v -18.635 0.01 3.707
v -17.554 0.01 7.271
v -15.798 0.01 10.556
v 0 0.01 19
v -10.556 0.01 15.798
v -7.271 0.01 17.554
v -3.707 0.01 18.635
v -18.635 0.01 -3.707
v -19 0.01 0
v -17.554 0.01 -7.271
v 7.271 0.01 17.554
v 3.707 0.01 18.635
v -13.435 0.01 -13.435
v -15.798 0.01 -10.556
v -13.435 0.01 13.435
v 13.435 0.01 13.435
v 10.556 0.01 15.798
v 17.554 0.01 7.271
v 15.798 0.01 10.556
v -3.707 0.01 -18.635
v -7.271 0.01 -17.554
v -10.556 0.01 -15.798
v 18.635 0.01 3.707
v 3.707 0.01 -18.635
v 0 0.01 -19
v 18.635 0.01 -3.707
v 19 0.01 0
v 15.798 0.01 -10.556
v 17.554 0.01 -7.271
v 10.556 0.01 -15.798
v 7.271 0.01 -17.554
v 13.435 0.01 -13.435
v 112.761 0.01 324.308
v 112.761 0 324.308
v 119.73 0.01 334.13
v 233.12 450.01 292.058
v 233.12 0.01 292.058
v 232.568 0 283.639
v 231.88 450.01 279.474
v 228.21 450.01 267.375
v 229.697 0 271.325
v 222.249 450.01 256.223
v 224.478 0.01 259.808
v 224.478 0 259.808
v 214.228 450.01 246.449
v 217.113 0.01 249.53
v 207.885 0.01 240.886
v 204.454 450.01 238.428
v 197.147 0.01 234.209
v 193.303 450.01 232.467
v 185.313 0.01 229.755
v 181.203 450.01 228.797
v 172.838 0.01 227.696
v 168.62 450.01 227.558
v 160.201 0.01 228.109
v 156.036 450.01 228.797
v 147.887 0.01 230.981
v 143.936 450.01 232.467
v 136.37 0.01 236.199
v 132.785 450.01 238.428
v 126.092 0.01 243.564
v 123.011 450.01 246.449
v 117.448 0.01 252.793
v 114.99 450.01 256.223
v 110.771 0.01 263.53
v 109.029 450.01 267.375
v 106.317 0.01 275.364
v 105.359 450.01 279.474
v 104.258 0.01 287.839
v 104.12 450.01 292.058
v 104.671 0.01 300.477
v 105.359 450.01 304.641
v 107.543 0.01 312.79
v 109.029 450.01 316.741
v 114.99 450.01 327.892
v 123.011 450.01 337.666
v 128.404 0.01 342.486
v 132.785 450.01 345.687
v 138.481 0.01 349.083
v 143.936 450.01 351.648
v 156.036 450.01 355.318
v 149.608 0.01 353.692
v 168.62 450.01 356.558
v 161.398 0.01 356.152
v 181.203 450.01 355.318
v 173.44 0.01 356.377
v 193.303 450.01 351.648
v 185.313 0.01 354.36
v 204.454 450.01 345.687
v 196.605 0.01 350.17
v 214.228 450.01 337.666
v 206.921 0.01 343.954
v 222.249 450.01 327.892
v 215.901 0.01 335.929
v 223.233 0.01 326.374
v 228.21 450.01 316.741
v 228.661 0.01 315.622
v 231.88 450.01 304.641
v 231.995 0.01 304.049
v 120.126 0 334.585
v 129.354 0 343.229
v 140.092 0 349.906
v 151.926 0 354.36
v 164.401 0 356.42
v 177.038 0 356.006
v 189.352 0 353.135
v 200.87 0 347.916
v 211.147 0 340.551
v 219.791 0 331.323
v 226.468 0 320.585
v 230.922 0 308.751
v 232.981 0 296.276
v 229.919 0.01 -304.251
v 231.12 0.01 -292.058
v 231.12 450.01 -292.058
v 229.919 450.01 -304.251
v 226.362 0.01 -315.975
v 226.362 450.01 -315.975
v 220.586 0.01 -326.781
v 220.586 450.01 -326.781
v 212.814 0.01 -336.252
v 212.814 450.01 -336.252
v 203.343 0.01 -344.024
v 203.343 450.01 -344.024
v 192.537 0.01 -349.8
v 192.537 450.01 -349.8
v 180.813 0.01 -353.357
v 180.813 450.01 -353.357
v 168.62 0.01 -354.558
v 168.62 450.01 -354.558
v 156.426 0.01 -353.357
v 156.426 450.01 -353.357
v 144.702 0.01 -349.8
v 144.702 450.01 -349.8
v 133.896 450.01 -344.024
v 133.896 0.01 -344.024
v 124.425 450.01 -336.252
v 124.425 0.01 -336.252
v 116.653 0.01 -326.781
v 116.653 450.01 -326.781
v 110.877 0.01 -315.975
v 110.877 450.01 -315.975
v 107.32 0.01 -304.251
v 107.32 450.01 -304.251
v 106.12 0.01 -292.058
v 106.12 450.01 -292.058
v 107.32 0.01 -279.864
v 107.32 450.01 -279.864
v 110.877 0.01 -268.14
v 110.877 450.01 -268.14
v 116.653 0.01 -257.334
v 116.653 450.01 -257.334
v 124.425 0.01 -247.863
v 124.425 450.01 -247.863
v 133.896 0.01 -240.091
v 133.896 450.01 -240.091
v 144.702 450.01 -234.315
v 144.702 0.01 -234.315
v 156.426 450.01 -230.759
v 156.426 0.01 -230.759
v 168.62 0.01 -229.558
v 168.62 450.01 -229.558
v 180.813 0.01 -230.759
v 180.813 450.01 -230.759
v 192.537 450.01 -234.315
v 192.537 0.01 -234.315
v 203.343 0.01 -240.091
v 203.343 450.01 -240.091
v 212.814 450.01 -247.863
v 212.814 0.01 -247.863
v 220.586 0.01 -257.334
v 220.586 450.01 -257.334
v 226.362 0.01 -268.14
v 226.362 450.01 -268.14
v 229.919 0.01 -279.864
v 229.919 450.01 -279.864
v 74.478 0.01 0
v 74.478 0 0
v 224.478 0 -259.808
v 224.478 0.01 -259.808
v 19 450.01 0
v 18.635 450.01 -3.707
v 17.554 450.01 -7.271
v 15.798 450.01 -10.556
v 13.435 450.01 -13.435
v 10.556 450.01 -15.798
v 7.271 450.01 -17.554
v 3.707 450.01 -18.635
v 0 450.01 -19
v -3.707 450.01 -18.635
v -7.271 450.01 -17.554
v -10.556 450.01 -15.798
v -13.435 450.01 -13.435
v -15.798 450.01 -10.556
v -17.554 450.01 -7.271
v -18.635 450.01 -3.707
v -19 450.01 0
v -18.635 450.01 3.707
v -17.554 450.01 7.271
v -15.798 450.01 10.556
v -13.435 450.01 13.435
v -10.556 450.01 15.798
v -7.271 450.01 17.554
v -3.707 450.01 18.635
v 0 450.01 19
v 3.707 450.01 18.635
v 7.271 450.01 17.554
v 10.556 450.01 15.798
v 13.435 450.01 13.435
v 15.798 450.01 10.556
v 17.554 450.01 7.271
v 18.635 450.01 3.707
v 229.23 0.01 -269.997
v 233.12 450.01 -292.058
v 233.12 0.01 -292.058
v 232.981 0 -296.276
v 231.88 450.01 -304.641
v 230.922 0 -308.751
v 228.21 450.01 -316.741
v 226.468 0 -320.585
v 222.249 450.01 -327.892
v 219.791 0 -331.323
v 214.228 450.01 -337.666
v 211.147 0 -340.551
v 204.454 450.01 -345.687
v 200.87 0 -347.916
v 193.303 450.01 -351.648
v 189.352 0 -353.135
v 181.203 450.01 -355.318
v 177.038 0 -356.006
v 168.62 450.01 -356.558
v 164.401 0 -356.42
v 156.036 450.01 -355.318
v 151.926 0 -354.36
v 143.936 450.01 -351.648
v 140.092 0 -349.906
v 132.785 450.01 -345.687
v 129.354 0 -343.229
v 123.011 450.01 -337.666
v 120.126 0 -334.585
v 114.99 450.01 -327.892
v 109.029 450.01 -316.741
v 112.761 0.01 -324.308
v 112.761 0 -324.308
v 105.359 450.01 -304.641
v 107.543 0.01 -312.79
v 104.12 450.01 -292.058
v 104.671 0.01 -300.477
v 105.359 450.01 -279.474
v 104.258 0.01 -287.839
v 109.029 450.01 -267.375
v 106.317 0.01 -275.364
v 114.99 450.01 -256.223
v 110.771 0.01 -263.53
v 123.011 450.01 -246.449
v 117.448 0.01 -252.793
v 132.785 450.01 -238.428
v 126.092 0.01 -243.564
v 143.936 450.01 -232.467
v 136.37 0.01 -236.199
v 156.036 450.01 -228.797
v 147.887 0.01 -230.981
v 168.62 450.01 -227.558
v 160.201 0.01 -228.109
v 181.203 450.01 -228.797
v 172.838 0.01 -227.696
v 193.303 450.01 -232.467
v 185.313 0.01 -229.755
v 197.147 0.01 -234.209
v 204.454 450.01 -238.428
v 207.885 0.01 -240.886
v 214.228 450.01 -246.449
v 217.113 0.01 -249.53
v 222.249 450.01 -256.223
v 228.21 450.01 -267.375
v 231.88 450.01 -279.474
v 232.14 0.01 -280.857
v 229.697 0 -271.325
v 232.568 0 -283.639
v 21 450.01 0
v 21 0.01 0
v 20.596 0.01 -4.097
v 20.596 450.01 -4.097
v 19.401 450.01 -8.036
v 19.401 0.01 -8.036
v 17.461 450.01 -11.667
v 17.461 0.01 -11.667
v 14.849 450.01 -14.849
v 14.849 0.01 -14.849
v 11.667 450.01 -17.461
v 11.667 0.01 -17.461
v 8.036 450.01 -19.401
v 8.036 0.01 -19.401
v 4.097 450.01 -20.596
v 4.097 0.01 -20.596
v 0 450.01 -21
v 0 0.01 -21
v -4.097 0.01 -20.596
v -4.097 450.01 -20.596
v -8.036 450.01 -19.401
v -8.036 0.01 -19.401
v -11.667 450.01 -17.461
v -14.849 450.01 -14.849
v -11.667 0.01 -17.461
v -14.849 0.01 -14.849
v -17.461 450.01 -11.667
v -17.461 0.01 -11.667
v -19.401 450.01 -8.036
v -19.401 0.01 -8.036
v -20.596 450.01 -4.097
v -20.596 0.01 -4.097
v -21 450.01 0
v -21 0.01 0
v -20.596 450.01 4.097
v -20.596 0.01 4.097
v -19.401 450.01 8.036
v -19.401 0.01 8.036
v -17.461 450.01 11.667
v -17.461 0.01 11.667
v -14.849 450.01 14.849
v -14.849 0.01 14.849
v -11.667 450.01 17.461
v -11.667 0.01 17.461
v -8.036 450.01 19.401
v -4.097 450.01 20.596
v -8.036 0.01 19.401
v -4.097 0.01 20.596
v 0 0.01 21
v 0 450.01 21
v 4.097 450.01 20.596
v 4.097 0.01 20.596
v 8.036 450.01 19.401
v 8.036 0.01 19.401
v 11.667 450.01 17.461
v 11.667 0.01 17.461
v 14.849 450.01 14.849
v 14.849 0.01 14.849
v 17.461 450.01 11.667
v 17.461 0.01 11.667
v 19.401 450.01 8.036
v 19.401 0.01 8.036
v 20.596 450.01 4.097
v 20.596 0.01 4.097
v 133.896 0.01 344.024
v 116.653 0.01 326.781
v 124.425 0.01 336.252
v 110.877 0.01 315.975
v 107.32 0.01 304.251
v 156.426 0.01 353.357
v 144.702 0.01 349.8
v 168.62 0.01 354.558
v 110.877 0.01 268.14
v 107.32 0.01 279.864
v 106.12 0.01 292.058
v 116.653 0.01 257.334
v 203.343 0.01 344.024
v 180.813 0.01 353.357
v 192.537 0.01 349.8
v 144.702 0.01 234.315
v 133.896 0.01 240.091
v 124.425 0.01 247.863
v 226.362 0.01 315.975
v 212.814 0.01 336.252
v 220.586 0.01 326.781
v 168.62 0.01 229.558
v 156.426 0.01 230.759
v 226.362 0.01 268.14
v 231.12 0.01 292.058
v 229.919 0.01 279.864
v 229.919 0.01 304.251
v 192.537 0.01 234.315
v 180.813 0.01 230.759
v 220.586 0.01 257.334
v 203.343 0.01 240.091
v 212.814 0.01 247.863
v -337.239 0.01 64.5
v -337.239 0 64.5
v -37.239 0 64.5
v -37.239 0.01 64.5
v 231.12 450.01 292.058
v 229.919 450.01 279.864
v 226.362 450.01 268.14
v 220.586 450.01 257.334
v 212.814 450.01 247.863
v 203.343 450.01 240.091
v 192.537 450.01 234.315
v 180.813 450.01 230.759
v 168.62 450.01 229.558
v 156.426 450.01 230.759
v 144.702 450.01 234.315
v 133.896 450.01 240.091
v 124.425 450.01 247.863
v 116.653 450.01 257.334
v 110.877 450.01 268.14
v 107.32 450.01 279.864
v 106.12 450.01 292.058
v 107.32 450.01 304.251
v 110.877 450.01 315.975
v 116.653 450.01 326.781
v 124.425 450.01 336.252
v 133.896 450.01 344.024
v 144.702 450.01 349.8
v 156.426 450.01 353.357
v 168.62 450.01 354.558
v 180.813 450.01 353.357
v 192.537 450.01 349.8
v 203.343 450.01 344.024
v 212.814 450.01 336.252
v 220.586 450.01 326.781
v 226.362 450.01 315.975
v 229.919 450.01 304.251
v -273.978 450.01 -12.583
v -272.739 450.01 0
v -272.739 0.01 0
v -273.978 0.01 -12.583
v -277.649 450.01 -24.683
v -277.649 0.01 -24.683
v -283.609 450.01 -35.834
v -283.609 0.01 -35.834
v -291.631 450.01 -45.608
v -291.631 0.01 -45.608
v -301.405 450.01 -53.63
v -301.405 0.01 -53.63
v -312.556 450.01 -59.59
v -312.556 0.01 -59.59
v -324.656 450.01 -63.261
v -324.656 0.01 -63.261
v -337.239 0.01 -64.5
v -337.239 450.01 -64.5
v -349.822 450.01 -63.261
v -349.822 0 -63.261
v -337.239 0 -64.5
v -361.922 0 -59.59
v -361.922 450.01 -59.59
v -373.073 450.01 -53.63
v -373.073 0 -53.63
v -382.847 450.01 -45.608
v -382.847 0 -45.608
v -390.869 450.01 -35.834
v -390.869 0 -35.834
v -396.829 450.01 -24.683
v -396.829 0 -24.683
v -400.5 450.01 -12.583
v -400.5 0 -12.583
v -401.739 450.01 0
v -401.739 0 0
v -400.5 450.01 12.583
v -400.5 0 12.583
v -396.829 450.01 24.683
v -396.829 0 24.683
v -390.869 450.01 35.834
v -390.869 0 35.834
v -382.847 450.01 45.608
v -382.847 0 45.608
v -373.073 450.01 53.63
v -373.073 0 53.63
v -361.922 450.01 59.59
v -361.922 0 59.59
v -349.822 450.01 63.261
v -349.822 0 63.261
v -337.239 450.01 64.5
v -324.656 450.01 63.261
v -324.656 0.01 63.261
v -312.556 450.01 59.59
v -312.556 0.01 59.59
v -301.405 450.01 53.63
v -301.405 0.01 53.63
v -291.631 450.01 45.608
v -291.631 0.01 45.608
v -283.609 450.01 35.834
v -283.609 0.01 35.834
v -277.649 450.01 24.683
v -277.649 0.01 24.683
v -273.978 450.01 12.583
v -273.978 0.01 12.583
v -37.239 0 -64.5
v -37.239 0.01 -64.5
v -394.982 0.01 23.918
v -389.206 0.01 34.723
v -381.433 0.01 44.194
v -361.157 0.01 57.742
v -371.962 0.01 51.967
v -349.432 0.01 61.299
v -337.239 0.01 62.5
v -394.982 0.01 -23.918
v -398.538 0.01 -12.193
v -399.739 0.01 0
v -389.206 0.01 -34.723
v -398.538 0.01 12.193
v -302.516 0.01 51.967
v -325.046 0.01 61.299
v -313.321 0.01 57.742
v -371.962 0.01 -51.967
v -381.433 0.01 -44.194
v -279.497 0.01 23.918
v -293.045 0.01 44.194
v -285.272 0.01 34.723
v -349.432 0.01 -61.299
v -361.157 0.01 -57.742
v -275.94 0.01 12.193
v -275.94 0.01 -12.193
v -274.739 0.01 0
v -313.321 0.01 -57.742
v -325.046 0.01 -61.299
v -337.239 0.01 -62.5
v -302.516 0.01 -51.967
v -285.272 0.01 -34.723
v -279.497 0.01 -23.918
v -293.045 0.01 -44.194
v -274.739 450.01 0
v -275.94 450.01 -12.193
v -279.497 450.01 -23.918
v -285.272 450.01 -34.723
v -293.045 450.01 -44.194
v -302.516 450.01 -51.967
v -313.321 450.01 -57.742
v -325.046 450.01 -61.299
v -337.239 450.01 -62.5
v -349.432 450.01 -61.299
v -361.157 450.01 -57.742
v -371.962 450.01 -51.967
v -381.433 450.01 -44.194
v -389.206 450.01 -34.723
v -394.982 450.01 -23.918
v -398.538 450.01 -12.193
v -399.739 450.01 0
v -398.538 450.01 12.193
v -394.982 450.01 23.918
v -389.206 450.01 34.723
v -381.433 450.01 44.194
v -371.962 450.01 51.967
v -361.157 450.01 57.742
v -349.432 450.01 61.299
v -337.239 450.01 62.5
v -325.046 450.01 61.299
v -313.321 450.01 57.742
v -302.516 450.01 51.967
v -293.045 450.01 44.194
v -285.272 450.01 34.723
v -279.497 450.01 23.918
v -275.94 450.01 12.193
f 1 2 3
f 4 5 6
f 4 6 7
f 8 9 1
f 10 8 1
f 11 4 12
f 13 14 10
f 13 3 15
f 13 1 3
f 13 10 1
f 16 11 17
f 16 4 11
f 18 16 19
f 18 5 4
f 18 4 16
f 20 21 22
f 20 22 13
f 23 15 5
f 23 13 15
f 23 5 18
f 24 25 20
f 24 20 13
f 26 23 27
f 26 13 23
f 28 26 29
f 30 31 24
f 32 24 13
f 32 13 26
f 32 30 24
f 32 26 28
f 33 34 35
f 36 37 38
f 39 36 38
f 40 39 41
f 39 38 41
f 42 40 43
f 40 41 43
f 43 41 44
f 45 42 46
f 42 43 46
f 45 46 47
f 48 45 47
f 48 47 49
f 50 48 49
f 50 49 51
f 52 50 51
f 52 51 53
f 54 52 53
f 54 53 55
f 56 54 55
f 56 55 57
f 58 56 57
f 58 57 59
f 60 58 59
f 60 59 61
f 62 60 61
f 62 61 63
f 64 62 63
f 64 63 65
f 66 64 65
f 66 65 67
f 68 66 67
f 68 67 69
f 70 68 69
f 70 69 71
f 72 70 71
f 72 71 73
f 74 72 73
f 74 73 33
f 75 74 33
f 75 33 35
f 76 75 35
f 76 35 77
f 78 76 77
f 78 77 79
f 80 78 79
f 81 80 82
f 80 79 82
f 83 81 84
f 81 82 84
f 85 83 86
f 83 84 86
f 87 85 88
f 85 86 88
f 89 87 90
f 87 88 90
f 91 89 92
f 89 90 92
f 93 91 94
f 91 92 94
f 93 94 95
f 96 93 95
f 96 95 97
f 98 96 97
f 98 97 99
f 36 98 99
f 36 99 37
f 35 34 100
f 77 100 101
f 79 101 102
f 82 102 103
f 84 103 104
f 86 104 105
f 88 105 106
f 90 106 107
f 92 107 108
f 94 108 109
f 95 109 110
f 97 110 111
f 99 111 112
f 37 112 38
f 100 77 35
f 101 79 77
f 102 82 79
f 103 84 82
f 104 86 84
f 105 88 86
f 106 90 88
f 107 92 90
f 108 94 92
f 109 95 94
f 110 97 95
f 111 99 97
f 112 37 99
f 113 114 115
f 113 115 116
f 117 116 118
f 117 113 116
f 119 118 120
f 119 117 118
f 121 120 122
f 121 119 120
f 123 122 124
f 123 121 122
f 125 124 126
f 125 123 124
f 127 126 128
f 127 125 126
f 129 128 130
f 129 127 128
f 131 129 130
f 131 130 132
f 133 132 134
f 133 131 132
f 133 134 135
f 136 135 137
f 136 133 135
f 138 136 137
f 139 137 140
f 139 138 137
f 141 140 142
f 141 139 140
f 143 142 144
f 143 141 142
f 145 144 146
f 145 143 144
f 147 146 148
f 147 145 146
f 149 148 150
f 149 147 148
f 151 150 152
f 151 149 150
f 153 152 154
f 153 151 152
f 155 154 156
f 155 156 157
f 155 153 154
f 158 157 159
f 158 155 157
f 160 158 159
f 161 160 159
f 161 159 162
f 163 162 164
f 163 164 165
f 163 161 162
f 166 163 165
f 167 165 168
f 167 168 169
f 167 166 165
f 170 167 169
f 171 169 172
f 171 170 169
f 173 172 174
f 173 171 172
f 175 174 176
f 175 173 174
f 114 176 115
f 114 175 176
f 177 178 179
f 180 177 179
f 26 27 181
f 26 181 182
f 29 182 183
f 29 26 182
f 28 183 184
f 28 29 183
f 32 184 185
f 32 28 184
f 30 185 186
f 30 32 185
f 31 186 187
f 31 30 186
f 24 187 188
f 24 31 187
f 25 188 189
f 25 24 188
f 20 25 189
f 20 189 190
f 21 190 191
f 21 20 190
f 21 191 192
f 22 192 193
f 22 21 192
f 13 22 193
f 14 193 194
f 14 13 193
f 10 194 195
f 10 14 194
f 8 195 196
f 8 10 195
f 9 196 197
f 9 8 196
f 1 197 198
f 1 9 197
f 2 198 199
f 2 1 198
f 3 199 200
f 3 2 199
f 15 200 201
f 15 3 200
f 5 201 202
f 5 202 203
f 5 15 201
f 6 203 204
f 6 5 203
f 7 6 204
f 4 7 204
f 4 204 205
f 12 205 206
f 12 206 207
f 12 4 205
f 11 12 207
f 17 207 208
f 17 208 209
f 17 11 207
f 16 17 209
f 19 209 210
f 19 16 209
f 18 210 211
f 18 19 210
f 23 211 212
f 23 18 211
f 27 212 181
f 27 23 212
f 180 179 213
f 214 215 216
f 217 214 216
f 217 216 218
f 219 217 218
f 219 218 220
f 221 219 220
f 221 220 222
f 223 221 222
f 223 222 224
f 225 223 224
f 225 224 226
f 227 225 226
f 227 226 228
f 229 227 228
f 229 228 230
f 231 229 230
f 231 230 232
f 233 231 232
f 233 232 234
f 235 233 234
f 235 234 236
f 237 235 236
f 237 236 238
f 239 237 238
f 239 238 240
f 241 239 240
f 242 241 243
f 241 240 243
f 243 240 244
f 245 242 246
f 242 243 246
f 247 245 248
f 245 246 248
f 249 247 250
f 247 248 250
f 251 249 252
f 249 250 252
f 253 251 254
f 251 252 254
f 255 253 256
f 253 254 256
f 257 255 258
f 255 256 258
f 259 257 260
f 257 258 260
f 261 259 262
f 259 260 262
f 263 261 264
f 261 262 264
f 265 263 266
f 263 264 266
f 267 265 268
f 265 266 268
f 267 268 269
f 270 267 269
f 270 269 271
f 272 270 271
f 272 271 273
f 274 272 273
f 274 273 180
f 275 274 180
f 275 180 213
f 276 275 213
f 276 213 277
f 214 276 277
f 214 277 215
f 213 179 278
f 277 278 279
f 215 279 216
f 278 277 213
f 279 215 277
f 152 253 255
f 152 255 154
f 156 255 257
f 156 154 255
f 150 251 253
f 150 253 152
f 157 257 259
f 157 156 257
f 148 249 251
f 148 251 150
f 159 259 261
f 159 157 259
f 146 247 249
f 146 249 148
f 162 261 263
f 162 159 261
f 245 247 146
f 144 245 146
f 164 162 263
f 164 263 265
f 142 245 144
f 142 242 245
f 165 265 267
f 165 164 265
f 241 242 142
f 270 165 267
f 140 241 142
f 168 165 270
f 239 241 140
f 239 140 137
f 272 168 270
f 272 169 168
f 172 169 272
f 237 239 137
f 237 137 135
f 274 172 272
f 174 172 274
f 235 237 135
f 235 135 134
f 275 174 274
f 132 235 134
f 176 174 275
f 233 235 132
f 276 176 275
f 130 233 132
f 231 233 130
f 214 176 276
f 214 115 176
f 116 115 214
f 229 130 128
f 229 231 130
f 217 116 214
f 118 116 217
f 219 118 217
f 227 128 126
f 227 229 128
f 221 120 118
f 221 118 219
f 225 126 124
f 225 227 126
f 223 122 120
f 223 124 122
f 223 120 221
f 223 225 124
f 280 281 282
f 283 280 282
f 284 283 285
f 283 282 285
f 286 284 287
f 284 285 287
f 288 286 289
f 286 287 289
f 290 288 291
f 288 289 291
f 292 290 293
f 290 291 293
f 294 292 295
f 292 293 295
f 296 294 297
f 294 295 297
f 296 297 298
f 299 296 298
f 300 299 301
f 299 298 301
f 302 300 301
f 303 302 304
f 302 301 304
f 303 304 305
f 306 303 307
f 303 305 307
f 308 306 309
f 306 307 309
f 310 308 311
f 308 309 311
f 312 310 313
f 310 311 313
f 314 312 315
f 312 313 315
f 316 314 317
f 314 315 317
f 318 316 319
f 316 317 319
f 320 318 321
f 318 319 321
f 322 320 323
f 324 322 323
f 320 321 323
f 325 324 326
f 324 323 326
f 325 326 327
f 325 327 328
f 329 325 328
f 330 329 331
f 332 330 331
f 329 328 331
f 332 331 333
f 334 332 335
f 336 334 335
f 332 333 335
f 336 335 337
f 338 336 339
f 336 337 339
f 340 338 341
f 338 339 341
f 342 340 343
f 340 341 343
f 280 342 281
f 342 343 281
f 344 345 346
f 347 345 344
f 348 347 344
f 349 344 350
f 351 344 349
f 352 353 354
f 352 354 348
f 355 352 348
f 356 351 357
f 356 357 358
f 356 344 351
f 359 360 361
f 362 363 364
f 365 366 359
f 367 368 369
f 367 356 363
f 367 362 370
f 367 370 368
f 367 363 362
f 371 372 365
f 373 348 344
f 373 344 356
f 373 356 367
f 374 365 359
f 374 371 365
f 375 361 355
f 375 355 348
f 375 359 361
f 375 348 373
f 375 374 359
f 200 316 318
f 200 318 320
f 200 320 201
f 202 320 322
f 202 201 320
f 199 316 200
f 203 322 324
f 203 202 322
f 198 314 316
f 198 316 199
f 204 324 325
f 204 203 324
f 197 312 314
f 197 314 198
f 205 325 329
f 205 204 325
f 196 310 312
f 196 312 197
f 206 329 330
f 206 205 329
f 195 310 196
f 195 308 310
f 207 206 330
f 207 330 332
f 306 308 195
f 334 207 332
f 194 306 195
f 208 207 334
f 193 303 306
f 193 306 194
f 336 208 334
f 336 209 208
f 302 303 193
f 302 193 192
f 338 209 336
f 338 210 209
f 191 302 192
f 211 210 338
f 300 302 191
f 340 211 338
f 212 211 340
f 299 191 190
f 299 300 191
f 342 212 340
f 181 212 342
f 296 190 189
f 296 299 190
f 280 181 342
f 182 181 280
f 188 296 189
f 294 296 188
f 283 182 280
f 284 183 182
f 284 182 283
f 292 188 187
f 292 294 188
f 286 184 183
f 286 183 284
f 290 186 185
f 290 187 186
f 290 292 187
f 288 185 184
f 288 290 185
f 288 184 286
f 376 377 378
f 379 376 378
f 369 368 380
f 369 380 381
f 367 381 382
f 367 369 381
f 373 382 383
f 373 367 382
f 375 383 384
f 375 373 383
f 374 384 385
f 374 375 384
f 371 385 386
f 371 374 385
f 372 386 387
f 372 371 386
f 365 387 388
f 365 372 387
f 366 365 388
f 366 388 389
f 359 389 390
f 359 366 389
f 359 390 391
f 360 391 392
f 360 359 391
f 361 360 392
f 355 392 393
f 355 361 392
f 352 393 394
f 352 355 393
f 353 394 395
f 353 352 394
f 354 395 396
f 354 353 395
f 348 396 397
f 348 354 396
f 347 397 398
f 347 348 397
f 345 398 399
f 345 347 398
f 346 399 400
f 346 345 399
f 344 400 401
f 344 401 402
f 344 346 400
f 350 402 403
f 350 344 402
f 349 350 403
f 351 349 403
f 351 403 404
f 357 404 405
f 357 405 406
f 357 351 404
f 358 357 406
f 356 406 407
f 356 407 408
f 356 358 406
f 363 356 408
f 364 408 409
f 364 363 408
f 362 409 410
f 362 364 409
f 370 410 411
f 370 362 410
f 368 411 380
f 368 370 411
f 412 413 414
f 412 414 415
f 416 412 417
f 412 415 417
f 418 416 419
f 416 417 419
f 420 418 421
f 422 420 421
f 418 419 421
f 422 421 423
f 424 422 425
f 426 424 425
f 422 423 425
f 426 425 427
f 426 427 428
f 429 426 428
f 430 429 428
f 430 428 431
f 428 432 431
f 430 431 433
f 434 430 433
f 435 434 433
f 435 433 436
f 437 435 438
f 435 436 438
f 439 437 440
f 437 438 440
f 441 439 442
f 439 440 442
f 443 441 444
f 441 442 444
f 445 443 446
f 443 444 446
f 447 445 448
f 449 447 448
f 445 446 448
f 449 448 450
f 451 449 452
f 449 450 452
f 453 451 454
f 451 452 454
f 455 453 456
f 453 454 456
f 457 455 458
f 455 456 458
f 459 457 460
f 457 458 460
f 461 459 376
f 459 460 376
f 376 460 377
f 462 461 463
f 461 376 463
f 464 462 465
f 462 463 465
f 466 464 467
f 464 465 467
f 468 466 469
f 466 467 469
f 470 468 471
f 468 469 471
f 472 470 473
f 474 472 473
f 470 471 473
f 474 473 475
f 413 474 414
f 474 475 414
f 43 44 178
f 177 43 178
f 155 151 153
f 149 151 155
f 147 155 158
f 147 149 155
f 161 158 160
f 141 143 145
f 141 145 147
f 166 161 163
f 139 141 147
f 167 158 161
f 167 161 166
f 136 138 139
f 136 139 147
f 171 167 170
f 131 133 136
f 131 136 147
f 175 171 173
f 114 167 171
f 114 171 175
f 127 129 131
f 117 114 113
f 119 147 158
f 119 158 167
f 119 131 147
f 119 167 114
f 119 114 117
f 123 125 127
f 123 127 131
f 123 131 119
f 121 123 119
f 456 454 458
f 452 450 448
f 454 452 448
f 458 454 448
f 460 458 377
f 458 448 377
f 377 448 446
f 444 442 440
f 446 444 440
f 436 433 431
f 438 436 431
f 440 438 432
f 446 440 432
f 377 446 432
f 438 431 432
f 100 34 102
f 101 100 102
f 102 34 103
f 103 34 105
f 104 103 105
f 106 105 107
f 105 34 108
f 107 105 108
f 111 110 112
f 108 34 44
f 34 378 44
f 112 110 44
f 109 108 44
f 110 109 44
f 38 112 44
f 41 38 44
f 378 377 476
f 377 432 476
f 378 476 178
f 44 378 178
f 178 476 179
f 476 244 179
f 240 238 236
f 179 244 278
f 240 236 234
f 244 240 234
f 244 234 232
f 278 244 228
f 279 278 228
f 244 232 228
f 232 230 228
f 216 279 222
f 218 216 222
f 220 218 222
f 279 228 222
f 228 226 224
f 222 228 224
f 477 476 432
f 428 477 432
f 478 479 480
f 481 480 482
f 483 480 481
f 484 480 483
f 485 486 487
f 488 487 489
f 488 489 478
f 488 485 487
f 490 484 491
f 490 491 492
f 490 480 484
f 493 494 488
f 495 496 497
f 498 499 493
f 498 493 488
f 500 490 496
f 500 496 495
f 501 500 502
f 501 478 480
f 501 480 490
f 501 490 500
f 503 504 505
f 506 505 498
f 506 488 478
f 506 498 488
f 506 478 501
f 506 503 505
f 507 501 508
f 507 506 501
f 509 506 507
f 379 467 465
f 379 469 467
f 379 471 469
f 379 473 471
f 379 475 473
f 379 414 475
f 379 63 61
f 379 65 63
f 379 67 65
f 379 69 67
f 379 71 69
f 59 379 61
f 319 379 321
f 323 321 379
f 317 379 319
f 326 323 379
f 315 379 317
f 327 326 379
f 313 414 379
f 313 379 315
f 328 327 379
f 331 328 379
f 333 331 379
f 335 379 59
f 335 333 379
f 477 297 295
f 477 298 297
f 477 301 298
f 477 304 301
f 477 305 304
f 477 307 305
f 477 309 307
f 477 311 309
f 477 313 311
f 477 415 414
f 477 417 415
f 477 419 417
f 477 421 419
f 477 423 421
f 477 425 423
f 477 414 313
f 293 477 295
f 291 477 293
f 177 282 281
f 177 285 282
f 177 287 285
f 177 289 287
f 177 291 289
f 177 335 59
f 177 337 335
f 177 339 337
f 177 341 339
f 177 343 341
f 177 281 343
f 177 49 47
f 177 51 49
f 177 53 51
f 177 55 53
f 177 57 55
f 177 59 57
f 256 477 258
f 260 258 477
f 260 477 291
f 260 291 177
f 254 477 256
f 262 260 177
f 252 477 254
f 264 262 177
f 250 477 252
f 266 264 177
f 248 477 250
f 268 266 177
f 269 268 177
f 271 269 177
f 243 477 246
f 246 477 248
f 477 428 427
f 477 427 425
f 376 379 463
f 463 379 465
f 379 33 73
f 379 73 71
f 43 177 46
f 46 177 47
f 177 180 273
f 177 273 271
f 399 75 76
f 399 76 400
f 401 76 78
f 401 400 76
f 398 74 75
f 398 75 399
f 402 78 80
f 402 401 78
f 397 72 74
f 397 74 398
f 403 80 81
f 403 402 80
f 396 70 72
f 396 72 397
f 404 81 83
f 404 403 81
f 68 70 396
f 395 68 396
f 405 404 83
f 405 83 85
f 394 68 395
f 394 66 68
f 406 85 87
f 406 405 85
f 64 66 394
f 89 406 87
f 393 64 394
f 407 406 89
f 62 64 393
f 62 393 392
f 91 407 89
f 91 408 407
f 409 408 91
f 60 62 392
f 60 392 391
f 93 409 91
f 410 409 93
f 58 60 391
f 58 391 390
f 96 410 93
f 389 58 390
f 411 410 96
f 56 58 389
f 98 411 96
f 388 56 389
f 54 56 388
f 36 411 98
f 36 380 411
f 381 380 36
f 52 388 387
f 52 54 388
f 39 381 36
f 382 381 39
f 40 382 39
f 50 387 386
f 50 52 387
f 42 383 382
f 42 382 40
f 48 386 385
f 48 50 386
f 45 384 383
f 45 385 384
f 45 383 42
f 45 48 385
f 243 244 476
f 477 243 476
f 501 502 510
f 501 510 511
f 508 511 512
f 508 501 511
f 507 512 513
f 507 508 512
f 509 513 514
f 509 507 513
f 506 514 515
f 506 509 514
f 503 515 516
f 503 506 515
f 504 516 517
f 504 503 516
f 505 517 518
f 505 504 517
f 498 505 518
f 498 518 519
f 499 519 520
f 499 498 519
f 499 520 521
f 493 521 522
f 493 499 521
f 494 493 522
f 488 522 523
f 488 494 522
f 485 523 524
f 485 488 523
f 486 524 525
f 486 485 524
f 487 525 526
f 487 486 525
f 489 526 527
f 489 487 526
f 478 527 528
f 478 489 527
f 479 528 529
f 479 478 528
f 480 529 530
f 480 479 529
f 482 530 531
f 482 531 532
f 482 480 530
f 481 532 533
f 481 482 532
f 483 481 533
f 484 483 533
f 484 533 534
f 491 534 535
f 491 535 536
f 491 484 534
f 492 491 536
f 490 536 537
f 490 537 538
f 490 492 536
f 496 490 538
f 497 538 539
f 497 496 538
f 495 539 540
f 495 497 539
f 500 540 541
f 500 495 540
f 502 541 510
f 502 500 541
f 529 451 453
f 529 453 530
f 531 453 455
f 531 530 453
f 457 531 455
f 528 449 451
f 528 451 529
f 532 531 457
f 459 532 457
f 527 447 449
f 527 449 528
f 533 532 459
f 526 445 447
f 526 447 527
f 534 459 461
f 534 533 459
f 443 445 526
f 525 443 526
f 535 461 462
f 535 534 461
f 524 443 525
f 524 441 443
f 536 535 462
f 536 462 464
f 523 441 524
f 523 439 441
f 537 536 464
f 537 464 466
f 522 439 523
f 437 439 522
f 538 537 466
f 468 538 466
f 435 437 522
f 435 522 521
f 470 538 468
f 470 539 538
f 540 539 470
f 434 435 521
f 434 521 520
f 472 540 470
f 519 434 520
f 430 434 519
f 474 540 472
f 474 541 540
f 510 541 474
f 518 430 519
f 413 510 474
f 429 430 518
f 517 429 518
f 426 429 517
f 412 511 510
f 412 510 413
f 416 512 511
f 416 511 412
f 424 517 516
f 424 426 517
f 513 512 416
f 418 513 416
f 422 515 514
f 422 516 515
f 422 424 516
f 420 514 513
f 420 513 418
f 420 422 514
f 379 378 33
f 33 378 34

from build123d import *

# Parameters (mm, degrees)
BOSS_EXTRUDE1_DEPTH = 0.01
SKETCH2_R           = 64.5
SKETCH2_R_2         = 62.5
SKETCH2_R_3         = 21
SKETCH2_R_4         = 19
BOSS_EXTRUDE2_DEPTH = 450


with BuildPart() as part:
    # Sketch1 → Boss-Extrude1 (new body)
    with BuildSketch(Plane(origin=(0, 0, 0), x_dir=(1, 0, 0), z_dir=(0, 1, 0))):
        with BuildLine():
            Line((-37.239092363, 64.5), (-337.239092363, 64.5))
            ThreePointArc((-337.239092363, 64.5), (-401.739092363, 0), (-337.239092363, -64.5))
            Line((-337.239092363, -64.5), (-37.239092363, -64.5))
            Line((-37.239092363, -64.5), (112.760907637, -324.307621135))
            ThreePointArc((112.760907637, -324.307621135), (200.869546181, -347.916259679), (224.478184725, -259.807621135))
            Line((224.478184725, -259.807621135), (74.478184725, 0))
            Line((74.478184725, 0), (224.478184725, 259.807621135))
            ThreePointArc((224.478184725, 259.807621135), (200.869546181, 347.916259679), (112.760907637, 324.307621135))
            Line((112.760907637, 324.307621135), (-37.239092363, 64.5))
        make_face()
    extrude(amount=BOSS_EXTRUDE1_DEPTH)

    # Sketch2 → Boss-Extrude2 (add)
    with BuildSketch(Plane(origin=(0, 0.01, 0), x_dir=(1, 0, 0), z_dir=(0, 1, 0))):
        with Locations((168.619546181, 292.057621135)):
            Circle(SKETCH2_R)
        with Locations((168.619546181, 292.057621135)):
            Circle(SKETCH2_R_2, mode=Mode.SUBTRACT)
        with Locations((-337.239092363, 0)):
            Circle(SKETCH2_R)
        with Locations((-337.239092363, 0)):
            Circle(SKETCH2_R_2, mode=Mode.SUBTRACT)
        with Locations((168.619546181, -292.057621135)):
            Circle(SKETCH2_R)
        with Locations((168.619546181, -292.057621135)):
            Circle(SKETCH2_R_2, mode=Mode.SUBTRACT)
        Circle(SKETCH2_R_3)
        Circle(SKETCH2_R_4, mode=Mode.SUBTRACT)
    extrude(amount=BOSS_EXTRUDE2_DEPTH)


solid = part.part
